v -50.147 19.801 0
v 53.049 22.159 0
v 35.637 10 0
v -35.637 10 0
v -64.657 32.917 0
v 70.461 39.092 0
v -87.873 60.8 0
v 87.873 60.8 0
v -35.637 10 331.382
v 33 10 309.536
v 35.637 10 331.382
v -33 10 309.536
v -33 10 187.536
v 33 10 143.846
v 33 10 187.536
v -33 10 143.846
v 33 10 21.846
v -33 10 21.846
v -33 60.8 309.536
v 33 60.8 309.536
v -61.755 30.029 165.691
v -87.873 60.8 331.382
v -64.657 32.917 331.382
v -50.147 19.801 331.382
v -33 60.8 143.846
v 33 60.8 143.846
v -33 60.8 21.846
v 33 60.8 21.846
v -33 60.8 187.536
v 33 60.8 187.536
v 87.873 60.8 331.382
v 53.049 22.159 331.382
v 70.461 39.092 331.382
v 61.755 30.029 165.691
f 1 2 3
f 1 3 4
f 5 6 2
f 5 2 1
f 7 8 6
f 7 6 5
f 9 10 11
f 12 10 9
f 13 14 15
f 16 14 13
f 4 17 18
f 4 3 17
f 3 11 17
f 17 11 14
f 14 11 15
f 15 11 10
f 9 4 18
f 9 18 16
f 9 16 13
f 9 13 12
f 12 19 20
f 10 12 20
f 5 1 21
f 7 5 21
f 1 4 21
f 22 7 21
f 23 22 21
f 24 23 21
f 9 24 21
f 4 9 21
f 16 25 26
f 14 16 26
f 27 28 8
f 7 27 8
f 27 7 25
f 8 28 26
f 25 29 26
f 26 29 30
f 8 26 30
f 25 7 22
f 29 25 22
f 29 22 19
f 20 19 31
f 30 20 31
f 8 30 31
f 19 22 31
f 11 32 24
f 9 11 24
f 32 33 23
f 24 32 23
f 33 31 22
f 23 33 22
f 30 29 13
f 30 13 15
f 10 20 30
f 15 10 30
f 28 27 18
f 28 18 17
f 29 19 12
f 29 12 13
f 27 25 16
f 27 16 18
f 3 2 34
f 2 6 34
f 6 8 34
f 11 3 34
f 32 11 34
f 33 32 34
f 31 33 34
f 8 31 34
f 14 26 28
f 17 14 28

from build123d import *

# Parameters (mm, degrees)
BOSS_EXTRUDE2_DEPTH = 331.382
SKETCH3_W           = 66
SKETCH3_H           = 122
CUT_EXTRUDE2_DEPTH  = 128.0000001
SKETCH4_W           = 80
SKETCH4_H           = 10
CUT_EXTRUDE3_DEPTH  = 332.3820001
SKETCH5_W           = 260
SKETCH5_H           = 70
CUT_EXTRUDE4_DEPTH  = 332.3820001


with BuildPart() as part:
    # Sketch2 → Boss-Extrude2 (new body)
    with BuildSketch(Plane.XY):
        with BuildLine():
            Line((-127, 127), (127, 127))
            add(Edge.make_bspline(
                [(-127, 127), (0, -127), (127, 127)],
                knots=[0.056028396, 0.056028396, 0.056028396, 0.943971604, 0.943971604, 0.943971604], degree=2))
        make_face()
    extrude(amount=BOSS_EXTRUDE2_DEPTH)

    # Sketch3 → Cut-Extrude2 (cut, through all)
    with BuildSketch(Plane(origin=(0, 127, 0), x_dir=(1, 0, 0), z_dir=(0, 1, 0))):
        with Locations((0, -82.8455)):
            Rectangle(SKETCH3_W, SKETCH3_H)
        with Locations((0, -248.5365)):
            Rectangle(SKETCH3_W, SKETCH3_H)
    extrude(amount=-CUT_EXTRUDE2_DEPTH, mode=Mode.SUBTRACT)

    # Sketch4 → Cut-Extrude3 (cut, through all)
    with BuildSketch(Plane(origin=(0, 0, 0), x_dir=(-1, 0, 0), z_dir=(0, 0, -1))):
        with Locations((0, 5)):
            Rectangle(SKETCH4_W, SKETCH4_H)
    extrude(amount=-CUT_EXTRUDE3_DEPTH, mode=Mode.SUBTRACT)

    # Sketch5 → Cut-Extrude4 (cut, through all)
    with BuildSketch(Plane.XY.offset(331.382)):
        with Locations((0, 95.8)):
            Rectangle(SKETCH5_W, SKETCH5_H)
    extrude(amount=-CUT_EXTRUDE4_DEPTH, mode=Mode.SUBTRACT)


solid = part.part
